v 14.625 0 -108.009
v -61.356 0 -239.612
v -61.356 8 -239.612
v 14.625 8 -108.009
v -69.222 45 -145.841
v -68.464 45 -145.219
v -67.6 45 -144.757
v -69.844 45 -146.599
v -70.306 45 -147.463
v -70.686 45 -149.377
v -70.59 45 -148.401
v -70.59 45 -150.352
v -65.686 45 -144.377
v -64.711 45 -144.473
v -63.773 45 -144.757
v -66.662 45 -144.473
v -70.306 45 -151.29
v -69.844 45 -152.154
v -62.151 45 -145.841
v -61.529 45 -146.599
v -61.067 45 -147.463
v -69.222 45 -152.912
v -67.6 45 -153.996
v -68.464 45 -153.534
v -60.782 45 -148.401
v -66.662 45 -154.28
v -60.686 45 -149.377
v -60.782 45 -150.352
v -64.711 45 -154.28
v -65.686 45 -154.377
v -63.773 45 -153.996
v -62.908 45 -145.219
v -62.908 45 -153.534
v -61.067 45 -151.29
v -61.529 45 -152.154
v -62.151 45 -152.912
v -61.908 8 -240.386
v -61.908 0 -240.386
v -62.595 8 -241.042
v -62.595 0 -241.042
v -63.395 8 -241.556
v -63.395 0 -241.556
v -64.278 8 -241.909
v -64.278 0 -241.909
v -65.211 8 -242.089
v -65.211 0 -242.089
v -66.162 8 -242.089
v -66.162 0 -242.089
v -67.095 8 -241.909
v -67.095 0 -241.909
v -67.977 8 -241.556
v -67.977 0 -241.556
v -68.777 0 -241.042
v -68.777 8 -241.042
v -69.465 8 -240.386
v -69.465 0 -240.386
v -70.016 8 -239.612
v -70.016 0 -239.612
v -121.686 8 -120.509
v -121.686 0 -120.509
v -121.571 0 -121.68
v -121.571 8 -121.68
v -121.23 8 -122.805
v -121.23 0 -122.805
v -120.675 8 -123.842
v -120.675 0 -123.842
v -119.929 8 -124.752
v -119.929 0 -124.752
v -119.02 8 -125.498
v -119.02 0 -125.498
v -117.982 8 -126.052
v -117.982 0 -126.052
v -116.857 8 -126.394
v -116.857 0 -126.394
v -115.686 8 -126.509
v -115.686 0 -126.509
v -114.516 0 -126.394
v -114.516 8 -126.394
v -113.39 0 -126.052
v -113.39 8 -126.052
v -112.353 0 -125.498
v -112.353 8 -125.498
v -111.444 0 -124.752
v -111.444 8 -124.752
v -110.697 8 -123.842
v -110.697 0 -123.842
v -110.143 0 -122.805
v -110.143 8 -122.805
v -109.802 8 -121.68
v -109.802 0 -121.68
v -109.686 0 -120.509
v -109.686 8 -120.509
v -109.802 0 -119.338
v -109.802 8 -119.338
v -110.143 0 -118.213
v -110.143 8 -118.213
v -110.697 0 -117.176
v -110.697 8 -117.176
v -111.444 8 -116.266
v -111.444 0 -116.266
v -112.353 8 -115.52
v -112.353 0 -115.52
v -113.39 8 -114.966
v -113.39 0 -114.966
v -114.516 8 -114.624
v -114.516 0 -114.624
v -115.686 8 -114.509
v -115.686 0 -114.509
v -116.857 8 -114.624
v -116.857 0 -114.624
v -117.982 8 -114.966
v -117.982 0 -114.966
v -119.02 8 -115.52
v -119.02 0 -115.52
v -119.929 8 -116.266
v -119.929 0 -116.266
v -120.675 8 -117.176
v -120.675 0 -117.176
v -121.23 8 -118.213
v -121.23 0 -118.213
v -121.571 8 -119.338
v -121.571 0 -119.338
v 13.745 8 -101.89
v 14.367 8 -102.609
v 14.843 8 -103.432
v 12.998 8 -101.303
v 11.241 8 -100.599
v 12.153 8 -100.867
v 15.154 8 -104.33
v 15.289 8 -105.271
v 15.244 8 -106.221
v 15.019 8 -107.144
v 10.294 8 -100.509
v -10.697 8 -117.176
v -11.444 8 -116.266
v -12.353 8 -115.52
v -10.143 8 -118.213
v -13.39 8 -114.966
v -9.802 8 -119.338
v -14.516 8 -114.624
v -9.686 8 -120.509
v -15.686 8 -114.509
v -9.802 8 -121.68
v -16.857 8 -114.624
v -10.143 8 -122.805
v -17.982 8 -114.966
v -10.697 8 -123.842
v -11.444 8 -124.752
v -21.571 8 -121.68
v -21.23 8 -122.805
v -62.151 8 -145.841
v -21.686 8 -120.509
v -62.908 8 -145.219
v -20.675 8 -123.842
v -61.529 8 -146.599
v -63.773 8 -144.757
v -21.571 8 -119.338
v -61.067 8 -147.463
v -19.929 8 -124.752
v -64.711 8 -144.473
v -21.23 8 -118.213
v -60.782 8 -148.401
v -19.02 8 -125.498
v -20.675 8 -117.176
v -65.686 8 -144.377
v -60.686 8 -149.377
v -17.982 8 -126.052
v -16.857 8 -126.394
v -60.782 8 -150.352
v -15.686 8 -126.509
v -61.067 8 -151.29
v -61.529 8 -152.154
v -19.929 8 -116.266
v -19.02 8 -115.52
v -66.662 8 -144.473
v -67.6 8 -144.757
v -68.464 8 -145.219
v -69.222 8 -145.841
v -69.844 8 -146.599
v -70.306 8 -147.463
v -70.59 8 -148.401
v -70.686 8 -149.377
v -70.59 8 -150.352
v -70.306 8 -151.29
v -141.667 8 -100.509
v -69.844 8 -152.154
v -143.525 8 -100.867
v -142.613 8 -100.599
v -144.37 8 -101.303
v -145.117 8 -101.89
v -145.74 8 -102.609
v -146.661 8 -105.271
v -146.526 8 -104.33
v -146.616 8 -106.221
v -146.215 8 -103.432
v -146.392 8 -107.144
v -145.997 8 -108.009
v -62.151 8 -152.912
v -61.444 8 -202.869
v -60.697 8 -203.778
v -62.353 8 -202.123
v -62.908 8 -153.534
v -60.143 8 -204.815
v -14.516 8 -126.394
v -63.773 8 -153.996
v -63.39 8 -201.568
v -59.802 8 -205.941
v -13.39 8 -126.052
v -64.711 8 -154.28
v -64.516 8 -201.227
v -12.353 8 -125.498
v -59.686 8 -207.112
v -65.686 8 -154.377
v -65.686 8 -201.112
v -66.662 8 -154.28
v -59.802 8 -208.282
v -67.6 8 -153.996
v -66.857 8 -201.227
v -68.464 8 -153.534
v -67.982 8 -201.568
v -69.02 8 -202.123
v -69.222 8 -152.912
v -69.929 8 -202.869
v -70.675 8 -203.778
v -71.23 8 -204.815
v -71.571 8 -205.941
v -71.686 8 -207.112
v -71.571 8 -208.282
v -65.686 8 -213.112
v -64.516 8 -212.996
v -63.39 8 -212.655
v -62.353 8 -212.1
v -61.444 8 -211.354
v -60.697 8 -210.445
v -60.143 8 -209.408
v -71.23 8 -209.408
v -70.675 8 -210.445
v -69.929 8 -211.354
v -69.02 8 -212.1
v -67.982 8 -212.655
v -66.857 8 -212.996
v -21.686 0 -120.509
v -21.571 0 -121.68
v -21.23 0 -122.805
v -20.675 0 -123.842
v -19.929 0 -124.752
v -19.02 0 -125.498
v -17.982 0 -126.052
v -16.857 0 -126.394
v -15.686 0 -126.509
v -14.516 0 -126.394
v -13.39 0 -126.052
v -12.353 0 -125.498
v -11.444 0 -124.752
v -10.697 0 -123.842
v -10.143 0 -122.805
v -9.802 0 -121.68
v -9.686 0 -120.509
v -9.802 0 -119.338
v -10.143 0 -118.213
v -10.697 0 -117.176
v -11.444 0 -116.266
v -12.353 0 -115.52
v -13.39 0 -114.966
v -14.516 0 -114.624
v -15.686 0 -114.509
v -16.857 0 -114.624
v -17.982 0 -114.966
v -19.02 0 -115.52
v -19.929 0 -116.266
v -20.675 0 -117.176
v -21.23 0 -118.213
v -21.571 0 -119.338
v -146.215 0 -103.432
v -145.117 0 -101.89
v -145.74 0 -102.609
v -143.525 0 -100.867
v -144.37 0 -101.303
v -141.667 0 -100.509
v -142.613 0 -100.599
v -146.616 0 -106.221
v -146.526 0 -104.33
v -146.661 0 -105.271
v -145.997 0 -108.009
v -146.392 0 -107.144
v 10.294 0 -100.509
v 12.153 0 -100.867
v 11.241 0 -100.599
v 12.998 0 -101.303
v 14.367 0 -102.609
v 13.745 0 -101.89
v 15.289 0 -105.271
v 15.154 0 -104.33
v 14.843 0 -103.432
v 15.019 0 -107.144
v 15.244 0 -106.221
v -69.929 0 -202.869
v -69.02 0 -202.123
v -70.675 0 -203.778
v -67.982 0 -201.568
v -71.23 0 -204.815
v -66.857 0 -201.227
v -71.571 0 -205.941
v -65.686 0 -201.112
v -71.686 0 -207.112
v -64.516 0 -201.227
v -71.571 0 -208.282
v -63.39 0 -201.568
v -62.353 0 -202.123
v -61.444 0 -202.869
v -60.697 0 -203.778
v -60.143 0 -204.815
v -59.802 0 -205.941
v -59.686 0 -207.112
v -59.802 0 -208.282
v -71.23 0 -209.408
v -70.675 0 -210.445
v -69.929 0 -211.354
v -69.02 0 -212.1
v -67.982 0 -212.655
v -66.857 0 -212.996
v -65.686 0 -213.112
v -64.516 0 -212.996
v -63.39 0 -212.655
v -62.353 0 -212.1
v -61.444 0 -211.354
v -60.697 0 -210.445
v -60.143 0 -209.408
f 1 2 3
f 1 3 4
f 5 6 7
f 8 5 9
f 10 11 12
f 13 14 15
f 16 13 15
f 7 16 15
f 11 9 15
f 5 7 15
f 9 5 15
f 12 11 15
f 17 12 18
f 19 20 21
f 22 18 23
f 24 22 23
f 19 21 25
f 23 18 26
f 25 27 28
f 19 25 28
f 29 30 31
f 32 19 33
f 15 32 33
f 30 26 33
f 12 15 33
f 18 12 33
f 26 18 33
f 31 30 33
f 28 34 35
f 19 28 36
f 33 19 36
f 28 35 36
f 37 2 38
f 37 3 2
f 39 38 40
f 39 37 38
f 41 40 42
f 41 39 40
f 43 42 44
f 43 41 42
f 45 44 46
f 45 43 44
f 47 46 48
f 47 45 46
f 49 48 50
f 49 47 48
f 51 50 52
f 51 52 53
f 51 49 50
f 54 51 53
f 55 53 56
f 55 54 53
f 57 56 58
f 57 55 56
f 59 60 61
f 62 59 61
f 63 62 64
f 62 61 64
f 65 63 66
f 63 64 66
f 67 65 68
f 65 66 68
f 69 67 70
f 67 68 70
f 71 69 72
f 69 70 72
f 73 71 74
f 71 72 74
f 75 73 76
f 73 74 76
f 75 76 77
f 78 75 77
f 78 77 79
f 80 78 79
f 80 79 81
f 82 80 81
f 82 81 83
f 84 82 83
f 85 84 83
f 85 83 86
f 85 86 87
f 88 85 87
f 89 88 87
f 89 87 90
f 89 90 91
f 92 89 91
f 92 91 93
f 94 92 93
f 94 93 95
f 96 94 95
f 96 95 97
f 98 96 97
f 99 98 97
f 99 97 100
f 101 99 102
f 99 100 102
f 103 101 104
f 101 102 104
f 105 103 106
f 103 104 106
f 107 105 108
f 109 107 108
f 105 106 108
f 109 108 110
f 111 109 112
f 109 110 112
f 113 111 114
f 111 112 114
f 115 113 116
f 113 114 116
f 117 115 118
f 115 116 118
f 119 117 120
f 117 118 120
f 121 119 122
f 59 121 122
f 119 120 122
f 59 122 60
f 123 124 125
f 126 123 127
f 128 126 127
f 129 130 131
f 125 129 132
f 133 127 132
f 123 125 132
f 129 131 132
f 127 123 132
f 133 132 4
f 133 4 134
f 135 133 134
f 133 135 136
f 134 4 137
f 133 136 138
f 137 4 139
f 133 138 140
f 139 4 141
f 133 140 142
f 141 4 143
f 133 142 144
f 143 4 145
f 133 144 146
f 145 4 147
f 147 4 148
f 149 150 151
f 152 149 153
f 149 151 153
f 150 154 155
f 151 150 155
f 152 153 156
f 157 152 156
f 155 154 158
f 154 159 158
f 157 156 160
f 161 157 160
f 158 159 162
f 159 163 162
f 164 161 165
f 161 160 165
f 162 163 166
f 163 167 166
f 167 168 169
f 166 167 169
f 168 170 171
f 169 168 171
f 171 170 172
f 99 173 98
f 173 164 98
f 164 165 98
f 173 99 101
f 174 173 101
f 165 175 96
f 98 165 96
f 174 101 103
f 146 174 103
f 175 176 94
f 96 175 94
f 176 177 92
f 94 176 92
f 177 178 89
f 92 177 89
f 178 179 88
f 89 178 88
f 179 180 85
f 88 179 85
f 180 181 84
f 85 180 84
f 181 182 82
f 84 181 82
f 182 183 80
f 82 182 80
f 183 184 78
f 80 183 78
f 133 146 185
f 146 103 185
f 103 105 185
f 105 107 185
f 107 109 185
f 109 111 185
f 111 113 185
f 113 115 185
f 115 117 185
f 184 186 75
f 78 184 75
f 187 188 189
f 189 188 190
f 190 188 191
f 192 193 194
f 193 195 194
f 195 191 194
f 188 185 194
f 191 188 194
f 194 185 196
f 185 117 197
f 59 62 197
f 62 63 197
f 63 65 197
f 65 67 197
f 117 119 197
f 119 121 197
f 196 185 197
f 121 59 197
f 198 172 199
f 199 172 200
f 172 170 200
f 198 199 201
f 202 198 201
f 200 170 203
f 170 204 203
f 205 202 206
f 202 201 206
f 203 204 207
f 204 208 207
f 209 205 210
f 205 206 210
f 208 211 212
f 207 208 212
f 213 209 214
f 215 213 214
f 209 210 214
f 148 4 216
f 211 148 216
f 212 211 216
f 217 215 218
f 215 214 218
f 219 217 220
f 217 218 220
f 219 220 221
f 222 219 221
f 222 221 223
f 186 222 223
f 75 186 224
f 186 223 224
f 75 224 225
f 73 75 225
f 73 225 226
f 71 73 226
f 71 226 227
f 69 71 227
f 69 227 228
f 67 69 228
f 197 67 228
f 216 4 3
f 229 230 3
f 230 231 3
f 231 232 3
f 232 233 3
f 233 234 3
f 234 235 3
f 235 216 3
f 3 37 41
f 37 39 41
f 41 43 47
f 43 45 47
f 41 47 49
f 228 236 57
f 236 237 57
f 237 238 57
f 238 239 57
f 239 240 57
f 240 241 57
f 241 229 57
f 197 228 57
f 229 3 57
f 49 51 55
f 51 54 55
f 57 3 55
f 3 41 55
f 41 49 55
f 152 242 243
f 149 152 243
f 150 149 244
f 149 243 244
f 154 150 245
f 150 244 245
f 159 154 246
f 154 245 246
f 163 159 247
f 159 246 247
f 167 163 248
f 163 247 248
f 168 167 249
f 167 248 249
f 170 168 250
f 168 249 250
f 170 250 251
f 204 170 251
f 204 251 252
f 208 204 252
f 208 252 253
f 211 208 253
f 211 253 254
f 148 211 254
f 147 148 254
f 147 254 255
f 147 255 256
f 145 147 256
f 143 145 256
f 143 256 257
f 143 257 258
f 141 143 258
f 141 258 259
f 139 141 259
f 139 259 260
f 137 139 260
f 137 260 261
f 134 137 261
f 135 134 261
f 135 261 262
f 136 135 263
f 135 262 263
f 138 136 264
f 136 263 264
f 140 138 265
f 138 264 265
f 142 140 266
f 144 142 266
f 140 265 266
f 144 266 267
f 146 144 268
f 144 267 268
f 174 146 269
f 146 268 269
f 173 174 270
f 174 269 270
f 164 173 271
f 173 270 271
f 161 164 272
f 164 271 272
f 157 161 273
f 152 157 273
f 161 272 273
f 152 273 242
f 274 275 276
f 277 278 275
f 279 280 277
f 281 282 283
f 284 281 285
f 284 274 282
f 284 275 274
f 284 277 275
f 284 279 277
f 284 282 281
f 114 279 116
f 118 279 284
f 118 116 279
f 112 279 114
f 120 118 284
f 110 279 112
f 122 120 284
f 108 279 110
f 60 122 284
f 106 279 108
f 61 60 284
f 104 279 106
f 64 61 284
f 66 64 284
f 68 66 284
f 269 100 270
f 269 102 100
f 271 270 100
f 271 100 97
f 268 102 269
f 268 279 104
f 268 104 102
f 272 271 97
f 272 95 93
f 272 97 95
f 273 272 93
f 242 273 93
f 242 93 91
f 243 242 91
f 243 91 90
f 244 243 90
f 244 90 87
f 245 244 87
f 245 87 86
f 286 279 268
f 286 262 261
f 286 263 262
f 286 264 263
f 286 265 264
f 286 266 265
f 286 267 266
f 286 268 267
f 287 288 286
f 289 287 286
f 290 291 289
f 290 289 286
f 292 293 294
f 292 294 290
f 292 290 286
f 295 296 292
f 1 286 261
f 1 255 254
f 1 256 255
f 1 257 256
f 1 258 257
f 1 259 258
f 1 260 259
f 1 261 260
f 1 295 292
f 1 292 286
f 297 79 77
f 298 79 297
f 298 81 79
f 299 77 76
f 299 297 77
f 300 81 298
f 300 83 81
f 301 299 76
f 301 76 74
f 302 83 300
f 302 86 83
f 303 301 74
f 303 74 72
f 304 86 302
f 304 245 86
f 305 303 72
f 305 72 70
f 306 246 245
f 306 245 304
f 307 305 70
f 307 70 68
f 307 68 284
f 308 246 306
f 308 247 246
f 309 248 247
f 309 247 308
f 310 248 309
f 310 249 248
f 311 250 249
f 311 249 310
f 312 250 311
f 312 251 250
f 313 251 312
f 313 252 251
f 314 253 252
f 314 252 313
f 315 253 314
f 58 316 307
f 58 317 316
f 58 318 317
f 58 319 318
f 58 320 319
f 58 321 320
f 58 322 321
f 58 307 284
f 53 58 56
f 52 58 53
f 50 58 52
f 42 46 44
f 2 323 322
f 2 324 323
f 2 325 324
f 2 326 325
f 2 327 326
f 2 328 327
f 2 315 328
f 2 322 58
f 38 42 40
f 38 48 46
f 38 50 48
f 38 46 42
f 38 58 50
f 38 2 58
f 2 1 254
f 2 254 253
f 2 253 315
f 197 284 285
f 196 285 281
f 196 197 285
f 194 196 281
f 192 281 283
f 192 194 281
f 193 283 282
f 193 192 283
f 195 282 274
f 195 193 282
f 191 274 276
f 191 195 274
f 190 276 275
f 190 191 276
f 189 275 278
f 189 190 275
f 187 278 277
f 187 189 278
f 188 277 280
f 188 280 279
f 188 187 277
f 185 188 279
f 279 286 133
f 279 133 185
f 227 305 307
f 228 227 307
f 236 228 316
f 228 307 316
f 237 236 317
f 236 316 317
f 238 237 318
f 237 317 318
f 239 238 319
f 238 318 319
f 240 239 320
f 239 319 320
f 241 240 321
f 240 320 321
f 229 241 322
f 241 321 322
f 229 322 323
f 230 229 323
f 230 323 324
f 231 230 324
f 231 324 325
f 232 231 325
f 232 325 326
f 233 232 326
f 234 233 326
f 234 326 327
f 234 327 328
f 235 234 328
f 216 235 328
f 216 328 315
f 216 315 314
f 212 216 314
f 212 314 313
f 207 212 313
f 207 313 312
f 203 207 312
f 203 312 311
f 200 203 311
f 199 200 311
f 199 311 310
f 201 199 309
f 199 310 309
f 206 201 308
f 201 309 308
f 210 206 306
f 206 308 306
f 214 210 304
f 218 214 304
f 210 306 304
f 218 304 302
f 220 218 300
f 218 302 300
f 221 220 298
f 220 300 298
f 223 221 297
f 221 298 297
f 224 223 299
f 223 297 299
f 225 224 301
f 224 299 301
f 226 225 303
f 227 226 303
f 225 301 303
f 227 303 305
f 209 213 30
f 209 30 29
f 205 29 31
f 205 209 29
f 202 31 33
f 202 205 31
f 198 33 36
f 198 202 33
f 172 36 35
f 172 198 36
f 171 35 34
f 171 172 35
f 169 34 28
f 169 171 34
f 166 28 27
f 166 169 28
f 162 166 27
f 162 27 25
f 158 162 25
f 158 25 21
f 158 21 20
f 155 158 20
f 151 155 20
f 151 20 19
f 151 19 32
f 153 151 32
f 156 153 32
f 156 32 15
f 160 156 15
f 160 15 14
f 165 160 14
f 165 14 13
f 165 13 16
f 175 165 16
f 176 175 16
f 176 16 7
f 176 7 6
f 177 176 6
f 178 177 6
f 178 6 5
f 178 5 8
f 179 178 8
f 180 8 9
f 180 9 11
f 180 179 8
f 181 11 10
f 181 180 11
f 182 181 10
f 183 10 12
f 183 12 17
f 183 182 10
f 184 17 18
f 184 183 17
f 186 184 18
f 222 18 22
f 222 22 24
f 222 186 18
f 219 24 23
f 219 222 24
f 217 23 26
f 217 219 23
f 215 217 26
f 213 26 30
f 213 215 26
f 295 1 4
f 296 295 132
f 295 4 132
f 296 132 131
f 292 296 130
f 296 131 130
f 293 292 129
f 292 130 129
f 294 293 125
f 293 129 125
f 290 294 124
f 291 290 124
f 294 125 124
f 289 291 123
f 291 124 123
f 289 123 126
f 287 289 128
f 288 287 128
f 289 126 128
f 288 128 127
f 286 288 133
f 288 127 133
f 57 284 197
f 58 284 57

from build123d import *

# Parameters (mm, degrees)
BOSS_EXTRUDE1_DEPTH        = 8
F_12_0_12_DIAMETER_HOLE1_D = 12
SKETCH8_R                  = 5
BOSS_EXTRUDE2_DEPTH        = 45
FILLET1_R                  = 5


with BuildPart() as part:
    # Sketch1 → Boss-Extrude1 (new body)
    with BuildSketch(Plane(origin=(0, 0, 0), x_dir=(1, 0, 0), z_dir=(0, 1, 0))):
        Polygon((-65.68627451, 247.111542704), (18.954741642, 100.509002326), (-150.327290661, 100.509002326), align=None)
    extrude(amount=BOSS_EXTRUDE1_DEPTH)

    # Ø12.0 (12) Diameter Hole1 (through all)
    with Locations(Plane(origin=(0, 8, 0), x_dir=(1, 0, 0), z_dir=(0, 1, 0))):
        with Locations((-65.68627451, 207.111542704), (-115.68627451, 120.509002326), (-15.68627451, 120.509002326)):
            Hole(F_12_0_12_DIAMETER_HOLE1_D / 2)

    # Sketch8 → Boss-Extrude2 (add)
    with BuildSketch(Plane(origin=(0, 0, 0), x_dir=(-1, 0, 0), z_dir=(0, -1, 0))):
        with Locations(Location((65.68627451, 149.376515785, 0), (0, 0, 90))):
            Circle(SKETCH8_R)
    extrude(amount=-BOSS_EXTRUDE2_DEPTH)

    # Fillet1
    fillet1_edges = [part.edges().sort_by_distance(p)[0] for p in [
        (-150.327290661, 4, -100.509002326),
        (18.954741642, 4, -100.509002326),
        (-65.68627451, 4, -247.111542704),
    ]]
    fillet(fillet1_edges, radius=FILLET1_R)


solid = part.part
